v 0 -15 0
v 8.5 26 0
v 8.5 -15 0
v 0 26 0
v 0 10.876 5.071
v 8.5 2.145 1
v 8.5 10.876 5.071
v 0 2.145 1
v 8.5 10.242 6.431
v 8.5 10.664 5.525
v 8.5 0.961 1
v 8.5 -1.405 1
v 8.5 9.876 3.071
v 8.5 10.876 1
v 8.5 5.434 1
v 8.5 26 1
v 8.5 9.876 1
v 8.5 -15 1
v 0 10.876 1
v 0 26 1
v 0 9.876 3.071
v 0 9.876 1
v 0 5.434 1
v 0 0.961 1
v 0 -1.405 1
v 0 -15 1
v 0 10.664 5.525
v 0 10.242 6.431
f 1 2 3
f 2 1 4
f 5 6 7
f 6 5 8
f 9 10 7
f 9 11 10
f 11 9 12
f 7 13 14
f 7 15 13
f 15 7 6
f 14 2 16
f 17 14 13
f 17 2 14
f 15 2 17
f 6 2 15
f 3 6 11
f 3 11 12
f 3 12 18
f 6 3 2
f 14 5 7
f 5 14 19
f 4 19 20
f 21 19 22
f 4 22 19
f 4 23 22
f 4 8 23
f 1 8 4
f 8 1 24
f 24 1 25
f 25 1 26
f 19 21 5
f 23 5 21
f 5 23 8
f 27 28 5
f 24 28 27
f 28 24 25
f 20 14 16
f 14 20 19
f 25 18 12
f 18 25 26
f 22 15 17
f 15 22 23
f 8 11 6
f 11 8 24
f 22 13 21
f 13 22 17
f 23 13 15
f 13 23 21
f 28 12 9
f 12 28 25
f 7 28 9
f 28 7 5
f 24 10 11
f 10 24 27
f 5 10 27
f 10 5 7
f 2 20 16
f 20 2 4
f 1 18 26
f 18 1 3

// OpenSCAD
// VARIABLES

stripWidth = 11;
gapLength = 8.5;
stripThickness = 0.5;
wallThickness = 1;
angle = 25;
finLength = 15;

// code
clip();

prismTop = stripWidth + wallThickness;
prismBack = prismTop * sin(angle);
prismBottom = prismTop * cos(angle);
finTotalLength = 2*finLength + stripWidth;
innerPrismScale = min((prismBack - 3*wallThickness)/prismBack, (prismBottom - 3*wallThickness)/prismBottom);

module clip() {

  difference() {

    prism(gapLength, prismBottom, prismBack);

    #translate([0, (prismBottom - prismBottom*innerPrismScale - wallThickness), wallThickness])
    scale([1, innerPrismScale, innerPrismScale])
        prism(gapLength, prismBottom, prismBack);

  }

  difference() {
    
    rotate([angle, 0, 0]) 
      translate([0, -prismTop, 0])
        cube([gapLength, 2*prismTop, (wallThickness + stripThickness)]);

    rotate([angle, 0, 0]) 
      translate([0, wallThickness, 0])
      cube([gapLength, stripWidth, stripThickness]);

    translate([0, -prismTop*1.5, -prismTop])
      cube([gapLength, 3*prismTop, prismTop]);
      
  }

  translate([0, -finLength, 0])
    cube([gapLength, finTotalLength, wallThickness]);

}

module prism(l, w, h){

  polyhedron(
    points=[[0,0,0], [l,0,0], [l,w,0], [0,w,0], [0,w,h], [l,w,h]],
    faces=[[0,1,2,3],[5,4,3,2],[0,4,5,1],[0,3,4],[5,2,1]]
  );
  
}
